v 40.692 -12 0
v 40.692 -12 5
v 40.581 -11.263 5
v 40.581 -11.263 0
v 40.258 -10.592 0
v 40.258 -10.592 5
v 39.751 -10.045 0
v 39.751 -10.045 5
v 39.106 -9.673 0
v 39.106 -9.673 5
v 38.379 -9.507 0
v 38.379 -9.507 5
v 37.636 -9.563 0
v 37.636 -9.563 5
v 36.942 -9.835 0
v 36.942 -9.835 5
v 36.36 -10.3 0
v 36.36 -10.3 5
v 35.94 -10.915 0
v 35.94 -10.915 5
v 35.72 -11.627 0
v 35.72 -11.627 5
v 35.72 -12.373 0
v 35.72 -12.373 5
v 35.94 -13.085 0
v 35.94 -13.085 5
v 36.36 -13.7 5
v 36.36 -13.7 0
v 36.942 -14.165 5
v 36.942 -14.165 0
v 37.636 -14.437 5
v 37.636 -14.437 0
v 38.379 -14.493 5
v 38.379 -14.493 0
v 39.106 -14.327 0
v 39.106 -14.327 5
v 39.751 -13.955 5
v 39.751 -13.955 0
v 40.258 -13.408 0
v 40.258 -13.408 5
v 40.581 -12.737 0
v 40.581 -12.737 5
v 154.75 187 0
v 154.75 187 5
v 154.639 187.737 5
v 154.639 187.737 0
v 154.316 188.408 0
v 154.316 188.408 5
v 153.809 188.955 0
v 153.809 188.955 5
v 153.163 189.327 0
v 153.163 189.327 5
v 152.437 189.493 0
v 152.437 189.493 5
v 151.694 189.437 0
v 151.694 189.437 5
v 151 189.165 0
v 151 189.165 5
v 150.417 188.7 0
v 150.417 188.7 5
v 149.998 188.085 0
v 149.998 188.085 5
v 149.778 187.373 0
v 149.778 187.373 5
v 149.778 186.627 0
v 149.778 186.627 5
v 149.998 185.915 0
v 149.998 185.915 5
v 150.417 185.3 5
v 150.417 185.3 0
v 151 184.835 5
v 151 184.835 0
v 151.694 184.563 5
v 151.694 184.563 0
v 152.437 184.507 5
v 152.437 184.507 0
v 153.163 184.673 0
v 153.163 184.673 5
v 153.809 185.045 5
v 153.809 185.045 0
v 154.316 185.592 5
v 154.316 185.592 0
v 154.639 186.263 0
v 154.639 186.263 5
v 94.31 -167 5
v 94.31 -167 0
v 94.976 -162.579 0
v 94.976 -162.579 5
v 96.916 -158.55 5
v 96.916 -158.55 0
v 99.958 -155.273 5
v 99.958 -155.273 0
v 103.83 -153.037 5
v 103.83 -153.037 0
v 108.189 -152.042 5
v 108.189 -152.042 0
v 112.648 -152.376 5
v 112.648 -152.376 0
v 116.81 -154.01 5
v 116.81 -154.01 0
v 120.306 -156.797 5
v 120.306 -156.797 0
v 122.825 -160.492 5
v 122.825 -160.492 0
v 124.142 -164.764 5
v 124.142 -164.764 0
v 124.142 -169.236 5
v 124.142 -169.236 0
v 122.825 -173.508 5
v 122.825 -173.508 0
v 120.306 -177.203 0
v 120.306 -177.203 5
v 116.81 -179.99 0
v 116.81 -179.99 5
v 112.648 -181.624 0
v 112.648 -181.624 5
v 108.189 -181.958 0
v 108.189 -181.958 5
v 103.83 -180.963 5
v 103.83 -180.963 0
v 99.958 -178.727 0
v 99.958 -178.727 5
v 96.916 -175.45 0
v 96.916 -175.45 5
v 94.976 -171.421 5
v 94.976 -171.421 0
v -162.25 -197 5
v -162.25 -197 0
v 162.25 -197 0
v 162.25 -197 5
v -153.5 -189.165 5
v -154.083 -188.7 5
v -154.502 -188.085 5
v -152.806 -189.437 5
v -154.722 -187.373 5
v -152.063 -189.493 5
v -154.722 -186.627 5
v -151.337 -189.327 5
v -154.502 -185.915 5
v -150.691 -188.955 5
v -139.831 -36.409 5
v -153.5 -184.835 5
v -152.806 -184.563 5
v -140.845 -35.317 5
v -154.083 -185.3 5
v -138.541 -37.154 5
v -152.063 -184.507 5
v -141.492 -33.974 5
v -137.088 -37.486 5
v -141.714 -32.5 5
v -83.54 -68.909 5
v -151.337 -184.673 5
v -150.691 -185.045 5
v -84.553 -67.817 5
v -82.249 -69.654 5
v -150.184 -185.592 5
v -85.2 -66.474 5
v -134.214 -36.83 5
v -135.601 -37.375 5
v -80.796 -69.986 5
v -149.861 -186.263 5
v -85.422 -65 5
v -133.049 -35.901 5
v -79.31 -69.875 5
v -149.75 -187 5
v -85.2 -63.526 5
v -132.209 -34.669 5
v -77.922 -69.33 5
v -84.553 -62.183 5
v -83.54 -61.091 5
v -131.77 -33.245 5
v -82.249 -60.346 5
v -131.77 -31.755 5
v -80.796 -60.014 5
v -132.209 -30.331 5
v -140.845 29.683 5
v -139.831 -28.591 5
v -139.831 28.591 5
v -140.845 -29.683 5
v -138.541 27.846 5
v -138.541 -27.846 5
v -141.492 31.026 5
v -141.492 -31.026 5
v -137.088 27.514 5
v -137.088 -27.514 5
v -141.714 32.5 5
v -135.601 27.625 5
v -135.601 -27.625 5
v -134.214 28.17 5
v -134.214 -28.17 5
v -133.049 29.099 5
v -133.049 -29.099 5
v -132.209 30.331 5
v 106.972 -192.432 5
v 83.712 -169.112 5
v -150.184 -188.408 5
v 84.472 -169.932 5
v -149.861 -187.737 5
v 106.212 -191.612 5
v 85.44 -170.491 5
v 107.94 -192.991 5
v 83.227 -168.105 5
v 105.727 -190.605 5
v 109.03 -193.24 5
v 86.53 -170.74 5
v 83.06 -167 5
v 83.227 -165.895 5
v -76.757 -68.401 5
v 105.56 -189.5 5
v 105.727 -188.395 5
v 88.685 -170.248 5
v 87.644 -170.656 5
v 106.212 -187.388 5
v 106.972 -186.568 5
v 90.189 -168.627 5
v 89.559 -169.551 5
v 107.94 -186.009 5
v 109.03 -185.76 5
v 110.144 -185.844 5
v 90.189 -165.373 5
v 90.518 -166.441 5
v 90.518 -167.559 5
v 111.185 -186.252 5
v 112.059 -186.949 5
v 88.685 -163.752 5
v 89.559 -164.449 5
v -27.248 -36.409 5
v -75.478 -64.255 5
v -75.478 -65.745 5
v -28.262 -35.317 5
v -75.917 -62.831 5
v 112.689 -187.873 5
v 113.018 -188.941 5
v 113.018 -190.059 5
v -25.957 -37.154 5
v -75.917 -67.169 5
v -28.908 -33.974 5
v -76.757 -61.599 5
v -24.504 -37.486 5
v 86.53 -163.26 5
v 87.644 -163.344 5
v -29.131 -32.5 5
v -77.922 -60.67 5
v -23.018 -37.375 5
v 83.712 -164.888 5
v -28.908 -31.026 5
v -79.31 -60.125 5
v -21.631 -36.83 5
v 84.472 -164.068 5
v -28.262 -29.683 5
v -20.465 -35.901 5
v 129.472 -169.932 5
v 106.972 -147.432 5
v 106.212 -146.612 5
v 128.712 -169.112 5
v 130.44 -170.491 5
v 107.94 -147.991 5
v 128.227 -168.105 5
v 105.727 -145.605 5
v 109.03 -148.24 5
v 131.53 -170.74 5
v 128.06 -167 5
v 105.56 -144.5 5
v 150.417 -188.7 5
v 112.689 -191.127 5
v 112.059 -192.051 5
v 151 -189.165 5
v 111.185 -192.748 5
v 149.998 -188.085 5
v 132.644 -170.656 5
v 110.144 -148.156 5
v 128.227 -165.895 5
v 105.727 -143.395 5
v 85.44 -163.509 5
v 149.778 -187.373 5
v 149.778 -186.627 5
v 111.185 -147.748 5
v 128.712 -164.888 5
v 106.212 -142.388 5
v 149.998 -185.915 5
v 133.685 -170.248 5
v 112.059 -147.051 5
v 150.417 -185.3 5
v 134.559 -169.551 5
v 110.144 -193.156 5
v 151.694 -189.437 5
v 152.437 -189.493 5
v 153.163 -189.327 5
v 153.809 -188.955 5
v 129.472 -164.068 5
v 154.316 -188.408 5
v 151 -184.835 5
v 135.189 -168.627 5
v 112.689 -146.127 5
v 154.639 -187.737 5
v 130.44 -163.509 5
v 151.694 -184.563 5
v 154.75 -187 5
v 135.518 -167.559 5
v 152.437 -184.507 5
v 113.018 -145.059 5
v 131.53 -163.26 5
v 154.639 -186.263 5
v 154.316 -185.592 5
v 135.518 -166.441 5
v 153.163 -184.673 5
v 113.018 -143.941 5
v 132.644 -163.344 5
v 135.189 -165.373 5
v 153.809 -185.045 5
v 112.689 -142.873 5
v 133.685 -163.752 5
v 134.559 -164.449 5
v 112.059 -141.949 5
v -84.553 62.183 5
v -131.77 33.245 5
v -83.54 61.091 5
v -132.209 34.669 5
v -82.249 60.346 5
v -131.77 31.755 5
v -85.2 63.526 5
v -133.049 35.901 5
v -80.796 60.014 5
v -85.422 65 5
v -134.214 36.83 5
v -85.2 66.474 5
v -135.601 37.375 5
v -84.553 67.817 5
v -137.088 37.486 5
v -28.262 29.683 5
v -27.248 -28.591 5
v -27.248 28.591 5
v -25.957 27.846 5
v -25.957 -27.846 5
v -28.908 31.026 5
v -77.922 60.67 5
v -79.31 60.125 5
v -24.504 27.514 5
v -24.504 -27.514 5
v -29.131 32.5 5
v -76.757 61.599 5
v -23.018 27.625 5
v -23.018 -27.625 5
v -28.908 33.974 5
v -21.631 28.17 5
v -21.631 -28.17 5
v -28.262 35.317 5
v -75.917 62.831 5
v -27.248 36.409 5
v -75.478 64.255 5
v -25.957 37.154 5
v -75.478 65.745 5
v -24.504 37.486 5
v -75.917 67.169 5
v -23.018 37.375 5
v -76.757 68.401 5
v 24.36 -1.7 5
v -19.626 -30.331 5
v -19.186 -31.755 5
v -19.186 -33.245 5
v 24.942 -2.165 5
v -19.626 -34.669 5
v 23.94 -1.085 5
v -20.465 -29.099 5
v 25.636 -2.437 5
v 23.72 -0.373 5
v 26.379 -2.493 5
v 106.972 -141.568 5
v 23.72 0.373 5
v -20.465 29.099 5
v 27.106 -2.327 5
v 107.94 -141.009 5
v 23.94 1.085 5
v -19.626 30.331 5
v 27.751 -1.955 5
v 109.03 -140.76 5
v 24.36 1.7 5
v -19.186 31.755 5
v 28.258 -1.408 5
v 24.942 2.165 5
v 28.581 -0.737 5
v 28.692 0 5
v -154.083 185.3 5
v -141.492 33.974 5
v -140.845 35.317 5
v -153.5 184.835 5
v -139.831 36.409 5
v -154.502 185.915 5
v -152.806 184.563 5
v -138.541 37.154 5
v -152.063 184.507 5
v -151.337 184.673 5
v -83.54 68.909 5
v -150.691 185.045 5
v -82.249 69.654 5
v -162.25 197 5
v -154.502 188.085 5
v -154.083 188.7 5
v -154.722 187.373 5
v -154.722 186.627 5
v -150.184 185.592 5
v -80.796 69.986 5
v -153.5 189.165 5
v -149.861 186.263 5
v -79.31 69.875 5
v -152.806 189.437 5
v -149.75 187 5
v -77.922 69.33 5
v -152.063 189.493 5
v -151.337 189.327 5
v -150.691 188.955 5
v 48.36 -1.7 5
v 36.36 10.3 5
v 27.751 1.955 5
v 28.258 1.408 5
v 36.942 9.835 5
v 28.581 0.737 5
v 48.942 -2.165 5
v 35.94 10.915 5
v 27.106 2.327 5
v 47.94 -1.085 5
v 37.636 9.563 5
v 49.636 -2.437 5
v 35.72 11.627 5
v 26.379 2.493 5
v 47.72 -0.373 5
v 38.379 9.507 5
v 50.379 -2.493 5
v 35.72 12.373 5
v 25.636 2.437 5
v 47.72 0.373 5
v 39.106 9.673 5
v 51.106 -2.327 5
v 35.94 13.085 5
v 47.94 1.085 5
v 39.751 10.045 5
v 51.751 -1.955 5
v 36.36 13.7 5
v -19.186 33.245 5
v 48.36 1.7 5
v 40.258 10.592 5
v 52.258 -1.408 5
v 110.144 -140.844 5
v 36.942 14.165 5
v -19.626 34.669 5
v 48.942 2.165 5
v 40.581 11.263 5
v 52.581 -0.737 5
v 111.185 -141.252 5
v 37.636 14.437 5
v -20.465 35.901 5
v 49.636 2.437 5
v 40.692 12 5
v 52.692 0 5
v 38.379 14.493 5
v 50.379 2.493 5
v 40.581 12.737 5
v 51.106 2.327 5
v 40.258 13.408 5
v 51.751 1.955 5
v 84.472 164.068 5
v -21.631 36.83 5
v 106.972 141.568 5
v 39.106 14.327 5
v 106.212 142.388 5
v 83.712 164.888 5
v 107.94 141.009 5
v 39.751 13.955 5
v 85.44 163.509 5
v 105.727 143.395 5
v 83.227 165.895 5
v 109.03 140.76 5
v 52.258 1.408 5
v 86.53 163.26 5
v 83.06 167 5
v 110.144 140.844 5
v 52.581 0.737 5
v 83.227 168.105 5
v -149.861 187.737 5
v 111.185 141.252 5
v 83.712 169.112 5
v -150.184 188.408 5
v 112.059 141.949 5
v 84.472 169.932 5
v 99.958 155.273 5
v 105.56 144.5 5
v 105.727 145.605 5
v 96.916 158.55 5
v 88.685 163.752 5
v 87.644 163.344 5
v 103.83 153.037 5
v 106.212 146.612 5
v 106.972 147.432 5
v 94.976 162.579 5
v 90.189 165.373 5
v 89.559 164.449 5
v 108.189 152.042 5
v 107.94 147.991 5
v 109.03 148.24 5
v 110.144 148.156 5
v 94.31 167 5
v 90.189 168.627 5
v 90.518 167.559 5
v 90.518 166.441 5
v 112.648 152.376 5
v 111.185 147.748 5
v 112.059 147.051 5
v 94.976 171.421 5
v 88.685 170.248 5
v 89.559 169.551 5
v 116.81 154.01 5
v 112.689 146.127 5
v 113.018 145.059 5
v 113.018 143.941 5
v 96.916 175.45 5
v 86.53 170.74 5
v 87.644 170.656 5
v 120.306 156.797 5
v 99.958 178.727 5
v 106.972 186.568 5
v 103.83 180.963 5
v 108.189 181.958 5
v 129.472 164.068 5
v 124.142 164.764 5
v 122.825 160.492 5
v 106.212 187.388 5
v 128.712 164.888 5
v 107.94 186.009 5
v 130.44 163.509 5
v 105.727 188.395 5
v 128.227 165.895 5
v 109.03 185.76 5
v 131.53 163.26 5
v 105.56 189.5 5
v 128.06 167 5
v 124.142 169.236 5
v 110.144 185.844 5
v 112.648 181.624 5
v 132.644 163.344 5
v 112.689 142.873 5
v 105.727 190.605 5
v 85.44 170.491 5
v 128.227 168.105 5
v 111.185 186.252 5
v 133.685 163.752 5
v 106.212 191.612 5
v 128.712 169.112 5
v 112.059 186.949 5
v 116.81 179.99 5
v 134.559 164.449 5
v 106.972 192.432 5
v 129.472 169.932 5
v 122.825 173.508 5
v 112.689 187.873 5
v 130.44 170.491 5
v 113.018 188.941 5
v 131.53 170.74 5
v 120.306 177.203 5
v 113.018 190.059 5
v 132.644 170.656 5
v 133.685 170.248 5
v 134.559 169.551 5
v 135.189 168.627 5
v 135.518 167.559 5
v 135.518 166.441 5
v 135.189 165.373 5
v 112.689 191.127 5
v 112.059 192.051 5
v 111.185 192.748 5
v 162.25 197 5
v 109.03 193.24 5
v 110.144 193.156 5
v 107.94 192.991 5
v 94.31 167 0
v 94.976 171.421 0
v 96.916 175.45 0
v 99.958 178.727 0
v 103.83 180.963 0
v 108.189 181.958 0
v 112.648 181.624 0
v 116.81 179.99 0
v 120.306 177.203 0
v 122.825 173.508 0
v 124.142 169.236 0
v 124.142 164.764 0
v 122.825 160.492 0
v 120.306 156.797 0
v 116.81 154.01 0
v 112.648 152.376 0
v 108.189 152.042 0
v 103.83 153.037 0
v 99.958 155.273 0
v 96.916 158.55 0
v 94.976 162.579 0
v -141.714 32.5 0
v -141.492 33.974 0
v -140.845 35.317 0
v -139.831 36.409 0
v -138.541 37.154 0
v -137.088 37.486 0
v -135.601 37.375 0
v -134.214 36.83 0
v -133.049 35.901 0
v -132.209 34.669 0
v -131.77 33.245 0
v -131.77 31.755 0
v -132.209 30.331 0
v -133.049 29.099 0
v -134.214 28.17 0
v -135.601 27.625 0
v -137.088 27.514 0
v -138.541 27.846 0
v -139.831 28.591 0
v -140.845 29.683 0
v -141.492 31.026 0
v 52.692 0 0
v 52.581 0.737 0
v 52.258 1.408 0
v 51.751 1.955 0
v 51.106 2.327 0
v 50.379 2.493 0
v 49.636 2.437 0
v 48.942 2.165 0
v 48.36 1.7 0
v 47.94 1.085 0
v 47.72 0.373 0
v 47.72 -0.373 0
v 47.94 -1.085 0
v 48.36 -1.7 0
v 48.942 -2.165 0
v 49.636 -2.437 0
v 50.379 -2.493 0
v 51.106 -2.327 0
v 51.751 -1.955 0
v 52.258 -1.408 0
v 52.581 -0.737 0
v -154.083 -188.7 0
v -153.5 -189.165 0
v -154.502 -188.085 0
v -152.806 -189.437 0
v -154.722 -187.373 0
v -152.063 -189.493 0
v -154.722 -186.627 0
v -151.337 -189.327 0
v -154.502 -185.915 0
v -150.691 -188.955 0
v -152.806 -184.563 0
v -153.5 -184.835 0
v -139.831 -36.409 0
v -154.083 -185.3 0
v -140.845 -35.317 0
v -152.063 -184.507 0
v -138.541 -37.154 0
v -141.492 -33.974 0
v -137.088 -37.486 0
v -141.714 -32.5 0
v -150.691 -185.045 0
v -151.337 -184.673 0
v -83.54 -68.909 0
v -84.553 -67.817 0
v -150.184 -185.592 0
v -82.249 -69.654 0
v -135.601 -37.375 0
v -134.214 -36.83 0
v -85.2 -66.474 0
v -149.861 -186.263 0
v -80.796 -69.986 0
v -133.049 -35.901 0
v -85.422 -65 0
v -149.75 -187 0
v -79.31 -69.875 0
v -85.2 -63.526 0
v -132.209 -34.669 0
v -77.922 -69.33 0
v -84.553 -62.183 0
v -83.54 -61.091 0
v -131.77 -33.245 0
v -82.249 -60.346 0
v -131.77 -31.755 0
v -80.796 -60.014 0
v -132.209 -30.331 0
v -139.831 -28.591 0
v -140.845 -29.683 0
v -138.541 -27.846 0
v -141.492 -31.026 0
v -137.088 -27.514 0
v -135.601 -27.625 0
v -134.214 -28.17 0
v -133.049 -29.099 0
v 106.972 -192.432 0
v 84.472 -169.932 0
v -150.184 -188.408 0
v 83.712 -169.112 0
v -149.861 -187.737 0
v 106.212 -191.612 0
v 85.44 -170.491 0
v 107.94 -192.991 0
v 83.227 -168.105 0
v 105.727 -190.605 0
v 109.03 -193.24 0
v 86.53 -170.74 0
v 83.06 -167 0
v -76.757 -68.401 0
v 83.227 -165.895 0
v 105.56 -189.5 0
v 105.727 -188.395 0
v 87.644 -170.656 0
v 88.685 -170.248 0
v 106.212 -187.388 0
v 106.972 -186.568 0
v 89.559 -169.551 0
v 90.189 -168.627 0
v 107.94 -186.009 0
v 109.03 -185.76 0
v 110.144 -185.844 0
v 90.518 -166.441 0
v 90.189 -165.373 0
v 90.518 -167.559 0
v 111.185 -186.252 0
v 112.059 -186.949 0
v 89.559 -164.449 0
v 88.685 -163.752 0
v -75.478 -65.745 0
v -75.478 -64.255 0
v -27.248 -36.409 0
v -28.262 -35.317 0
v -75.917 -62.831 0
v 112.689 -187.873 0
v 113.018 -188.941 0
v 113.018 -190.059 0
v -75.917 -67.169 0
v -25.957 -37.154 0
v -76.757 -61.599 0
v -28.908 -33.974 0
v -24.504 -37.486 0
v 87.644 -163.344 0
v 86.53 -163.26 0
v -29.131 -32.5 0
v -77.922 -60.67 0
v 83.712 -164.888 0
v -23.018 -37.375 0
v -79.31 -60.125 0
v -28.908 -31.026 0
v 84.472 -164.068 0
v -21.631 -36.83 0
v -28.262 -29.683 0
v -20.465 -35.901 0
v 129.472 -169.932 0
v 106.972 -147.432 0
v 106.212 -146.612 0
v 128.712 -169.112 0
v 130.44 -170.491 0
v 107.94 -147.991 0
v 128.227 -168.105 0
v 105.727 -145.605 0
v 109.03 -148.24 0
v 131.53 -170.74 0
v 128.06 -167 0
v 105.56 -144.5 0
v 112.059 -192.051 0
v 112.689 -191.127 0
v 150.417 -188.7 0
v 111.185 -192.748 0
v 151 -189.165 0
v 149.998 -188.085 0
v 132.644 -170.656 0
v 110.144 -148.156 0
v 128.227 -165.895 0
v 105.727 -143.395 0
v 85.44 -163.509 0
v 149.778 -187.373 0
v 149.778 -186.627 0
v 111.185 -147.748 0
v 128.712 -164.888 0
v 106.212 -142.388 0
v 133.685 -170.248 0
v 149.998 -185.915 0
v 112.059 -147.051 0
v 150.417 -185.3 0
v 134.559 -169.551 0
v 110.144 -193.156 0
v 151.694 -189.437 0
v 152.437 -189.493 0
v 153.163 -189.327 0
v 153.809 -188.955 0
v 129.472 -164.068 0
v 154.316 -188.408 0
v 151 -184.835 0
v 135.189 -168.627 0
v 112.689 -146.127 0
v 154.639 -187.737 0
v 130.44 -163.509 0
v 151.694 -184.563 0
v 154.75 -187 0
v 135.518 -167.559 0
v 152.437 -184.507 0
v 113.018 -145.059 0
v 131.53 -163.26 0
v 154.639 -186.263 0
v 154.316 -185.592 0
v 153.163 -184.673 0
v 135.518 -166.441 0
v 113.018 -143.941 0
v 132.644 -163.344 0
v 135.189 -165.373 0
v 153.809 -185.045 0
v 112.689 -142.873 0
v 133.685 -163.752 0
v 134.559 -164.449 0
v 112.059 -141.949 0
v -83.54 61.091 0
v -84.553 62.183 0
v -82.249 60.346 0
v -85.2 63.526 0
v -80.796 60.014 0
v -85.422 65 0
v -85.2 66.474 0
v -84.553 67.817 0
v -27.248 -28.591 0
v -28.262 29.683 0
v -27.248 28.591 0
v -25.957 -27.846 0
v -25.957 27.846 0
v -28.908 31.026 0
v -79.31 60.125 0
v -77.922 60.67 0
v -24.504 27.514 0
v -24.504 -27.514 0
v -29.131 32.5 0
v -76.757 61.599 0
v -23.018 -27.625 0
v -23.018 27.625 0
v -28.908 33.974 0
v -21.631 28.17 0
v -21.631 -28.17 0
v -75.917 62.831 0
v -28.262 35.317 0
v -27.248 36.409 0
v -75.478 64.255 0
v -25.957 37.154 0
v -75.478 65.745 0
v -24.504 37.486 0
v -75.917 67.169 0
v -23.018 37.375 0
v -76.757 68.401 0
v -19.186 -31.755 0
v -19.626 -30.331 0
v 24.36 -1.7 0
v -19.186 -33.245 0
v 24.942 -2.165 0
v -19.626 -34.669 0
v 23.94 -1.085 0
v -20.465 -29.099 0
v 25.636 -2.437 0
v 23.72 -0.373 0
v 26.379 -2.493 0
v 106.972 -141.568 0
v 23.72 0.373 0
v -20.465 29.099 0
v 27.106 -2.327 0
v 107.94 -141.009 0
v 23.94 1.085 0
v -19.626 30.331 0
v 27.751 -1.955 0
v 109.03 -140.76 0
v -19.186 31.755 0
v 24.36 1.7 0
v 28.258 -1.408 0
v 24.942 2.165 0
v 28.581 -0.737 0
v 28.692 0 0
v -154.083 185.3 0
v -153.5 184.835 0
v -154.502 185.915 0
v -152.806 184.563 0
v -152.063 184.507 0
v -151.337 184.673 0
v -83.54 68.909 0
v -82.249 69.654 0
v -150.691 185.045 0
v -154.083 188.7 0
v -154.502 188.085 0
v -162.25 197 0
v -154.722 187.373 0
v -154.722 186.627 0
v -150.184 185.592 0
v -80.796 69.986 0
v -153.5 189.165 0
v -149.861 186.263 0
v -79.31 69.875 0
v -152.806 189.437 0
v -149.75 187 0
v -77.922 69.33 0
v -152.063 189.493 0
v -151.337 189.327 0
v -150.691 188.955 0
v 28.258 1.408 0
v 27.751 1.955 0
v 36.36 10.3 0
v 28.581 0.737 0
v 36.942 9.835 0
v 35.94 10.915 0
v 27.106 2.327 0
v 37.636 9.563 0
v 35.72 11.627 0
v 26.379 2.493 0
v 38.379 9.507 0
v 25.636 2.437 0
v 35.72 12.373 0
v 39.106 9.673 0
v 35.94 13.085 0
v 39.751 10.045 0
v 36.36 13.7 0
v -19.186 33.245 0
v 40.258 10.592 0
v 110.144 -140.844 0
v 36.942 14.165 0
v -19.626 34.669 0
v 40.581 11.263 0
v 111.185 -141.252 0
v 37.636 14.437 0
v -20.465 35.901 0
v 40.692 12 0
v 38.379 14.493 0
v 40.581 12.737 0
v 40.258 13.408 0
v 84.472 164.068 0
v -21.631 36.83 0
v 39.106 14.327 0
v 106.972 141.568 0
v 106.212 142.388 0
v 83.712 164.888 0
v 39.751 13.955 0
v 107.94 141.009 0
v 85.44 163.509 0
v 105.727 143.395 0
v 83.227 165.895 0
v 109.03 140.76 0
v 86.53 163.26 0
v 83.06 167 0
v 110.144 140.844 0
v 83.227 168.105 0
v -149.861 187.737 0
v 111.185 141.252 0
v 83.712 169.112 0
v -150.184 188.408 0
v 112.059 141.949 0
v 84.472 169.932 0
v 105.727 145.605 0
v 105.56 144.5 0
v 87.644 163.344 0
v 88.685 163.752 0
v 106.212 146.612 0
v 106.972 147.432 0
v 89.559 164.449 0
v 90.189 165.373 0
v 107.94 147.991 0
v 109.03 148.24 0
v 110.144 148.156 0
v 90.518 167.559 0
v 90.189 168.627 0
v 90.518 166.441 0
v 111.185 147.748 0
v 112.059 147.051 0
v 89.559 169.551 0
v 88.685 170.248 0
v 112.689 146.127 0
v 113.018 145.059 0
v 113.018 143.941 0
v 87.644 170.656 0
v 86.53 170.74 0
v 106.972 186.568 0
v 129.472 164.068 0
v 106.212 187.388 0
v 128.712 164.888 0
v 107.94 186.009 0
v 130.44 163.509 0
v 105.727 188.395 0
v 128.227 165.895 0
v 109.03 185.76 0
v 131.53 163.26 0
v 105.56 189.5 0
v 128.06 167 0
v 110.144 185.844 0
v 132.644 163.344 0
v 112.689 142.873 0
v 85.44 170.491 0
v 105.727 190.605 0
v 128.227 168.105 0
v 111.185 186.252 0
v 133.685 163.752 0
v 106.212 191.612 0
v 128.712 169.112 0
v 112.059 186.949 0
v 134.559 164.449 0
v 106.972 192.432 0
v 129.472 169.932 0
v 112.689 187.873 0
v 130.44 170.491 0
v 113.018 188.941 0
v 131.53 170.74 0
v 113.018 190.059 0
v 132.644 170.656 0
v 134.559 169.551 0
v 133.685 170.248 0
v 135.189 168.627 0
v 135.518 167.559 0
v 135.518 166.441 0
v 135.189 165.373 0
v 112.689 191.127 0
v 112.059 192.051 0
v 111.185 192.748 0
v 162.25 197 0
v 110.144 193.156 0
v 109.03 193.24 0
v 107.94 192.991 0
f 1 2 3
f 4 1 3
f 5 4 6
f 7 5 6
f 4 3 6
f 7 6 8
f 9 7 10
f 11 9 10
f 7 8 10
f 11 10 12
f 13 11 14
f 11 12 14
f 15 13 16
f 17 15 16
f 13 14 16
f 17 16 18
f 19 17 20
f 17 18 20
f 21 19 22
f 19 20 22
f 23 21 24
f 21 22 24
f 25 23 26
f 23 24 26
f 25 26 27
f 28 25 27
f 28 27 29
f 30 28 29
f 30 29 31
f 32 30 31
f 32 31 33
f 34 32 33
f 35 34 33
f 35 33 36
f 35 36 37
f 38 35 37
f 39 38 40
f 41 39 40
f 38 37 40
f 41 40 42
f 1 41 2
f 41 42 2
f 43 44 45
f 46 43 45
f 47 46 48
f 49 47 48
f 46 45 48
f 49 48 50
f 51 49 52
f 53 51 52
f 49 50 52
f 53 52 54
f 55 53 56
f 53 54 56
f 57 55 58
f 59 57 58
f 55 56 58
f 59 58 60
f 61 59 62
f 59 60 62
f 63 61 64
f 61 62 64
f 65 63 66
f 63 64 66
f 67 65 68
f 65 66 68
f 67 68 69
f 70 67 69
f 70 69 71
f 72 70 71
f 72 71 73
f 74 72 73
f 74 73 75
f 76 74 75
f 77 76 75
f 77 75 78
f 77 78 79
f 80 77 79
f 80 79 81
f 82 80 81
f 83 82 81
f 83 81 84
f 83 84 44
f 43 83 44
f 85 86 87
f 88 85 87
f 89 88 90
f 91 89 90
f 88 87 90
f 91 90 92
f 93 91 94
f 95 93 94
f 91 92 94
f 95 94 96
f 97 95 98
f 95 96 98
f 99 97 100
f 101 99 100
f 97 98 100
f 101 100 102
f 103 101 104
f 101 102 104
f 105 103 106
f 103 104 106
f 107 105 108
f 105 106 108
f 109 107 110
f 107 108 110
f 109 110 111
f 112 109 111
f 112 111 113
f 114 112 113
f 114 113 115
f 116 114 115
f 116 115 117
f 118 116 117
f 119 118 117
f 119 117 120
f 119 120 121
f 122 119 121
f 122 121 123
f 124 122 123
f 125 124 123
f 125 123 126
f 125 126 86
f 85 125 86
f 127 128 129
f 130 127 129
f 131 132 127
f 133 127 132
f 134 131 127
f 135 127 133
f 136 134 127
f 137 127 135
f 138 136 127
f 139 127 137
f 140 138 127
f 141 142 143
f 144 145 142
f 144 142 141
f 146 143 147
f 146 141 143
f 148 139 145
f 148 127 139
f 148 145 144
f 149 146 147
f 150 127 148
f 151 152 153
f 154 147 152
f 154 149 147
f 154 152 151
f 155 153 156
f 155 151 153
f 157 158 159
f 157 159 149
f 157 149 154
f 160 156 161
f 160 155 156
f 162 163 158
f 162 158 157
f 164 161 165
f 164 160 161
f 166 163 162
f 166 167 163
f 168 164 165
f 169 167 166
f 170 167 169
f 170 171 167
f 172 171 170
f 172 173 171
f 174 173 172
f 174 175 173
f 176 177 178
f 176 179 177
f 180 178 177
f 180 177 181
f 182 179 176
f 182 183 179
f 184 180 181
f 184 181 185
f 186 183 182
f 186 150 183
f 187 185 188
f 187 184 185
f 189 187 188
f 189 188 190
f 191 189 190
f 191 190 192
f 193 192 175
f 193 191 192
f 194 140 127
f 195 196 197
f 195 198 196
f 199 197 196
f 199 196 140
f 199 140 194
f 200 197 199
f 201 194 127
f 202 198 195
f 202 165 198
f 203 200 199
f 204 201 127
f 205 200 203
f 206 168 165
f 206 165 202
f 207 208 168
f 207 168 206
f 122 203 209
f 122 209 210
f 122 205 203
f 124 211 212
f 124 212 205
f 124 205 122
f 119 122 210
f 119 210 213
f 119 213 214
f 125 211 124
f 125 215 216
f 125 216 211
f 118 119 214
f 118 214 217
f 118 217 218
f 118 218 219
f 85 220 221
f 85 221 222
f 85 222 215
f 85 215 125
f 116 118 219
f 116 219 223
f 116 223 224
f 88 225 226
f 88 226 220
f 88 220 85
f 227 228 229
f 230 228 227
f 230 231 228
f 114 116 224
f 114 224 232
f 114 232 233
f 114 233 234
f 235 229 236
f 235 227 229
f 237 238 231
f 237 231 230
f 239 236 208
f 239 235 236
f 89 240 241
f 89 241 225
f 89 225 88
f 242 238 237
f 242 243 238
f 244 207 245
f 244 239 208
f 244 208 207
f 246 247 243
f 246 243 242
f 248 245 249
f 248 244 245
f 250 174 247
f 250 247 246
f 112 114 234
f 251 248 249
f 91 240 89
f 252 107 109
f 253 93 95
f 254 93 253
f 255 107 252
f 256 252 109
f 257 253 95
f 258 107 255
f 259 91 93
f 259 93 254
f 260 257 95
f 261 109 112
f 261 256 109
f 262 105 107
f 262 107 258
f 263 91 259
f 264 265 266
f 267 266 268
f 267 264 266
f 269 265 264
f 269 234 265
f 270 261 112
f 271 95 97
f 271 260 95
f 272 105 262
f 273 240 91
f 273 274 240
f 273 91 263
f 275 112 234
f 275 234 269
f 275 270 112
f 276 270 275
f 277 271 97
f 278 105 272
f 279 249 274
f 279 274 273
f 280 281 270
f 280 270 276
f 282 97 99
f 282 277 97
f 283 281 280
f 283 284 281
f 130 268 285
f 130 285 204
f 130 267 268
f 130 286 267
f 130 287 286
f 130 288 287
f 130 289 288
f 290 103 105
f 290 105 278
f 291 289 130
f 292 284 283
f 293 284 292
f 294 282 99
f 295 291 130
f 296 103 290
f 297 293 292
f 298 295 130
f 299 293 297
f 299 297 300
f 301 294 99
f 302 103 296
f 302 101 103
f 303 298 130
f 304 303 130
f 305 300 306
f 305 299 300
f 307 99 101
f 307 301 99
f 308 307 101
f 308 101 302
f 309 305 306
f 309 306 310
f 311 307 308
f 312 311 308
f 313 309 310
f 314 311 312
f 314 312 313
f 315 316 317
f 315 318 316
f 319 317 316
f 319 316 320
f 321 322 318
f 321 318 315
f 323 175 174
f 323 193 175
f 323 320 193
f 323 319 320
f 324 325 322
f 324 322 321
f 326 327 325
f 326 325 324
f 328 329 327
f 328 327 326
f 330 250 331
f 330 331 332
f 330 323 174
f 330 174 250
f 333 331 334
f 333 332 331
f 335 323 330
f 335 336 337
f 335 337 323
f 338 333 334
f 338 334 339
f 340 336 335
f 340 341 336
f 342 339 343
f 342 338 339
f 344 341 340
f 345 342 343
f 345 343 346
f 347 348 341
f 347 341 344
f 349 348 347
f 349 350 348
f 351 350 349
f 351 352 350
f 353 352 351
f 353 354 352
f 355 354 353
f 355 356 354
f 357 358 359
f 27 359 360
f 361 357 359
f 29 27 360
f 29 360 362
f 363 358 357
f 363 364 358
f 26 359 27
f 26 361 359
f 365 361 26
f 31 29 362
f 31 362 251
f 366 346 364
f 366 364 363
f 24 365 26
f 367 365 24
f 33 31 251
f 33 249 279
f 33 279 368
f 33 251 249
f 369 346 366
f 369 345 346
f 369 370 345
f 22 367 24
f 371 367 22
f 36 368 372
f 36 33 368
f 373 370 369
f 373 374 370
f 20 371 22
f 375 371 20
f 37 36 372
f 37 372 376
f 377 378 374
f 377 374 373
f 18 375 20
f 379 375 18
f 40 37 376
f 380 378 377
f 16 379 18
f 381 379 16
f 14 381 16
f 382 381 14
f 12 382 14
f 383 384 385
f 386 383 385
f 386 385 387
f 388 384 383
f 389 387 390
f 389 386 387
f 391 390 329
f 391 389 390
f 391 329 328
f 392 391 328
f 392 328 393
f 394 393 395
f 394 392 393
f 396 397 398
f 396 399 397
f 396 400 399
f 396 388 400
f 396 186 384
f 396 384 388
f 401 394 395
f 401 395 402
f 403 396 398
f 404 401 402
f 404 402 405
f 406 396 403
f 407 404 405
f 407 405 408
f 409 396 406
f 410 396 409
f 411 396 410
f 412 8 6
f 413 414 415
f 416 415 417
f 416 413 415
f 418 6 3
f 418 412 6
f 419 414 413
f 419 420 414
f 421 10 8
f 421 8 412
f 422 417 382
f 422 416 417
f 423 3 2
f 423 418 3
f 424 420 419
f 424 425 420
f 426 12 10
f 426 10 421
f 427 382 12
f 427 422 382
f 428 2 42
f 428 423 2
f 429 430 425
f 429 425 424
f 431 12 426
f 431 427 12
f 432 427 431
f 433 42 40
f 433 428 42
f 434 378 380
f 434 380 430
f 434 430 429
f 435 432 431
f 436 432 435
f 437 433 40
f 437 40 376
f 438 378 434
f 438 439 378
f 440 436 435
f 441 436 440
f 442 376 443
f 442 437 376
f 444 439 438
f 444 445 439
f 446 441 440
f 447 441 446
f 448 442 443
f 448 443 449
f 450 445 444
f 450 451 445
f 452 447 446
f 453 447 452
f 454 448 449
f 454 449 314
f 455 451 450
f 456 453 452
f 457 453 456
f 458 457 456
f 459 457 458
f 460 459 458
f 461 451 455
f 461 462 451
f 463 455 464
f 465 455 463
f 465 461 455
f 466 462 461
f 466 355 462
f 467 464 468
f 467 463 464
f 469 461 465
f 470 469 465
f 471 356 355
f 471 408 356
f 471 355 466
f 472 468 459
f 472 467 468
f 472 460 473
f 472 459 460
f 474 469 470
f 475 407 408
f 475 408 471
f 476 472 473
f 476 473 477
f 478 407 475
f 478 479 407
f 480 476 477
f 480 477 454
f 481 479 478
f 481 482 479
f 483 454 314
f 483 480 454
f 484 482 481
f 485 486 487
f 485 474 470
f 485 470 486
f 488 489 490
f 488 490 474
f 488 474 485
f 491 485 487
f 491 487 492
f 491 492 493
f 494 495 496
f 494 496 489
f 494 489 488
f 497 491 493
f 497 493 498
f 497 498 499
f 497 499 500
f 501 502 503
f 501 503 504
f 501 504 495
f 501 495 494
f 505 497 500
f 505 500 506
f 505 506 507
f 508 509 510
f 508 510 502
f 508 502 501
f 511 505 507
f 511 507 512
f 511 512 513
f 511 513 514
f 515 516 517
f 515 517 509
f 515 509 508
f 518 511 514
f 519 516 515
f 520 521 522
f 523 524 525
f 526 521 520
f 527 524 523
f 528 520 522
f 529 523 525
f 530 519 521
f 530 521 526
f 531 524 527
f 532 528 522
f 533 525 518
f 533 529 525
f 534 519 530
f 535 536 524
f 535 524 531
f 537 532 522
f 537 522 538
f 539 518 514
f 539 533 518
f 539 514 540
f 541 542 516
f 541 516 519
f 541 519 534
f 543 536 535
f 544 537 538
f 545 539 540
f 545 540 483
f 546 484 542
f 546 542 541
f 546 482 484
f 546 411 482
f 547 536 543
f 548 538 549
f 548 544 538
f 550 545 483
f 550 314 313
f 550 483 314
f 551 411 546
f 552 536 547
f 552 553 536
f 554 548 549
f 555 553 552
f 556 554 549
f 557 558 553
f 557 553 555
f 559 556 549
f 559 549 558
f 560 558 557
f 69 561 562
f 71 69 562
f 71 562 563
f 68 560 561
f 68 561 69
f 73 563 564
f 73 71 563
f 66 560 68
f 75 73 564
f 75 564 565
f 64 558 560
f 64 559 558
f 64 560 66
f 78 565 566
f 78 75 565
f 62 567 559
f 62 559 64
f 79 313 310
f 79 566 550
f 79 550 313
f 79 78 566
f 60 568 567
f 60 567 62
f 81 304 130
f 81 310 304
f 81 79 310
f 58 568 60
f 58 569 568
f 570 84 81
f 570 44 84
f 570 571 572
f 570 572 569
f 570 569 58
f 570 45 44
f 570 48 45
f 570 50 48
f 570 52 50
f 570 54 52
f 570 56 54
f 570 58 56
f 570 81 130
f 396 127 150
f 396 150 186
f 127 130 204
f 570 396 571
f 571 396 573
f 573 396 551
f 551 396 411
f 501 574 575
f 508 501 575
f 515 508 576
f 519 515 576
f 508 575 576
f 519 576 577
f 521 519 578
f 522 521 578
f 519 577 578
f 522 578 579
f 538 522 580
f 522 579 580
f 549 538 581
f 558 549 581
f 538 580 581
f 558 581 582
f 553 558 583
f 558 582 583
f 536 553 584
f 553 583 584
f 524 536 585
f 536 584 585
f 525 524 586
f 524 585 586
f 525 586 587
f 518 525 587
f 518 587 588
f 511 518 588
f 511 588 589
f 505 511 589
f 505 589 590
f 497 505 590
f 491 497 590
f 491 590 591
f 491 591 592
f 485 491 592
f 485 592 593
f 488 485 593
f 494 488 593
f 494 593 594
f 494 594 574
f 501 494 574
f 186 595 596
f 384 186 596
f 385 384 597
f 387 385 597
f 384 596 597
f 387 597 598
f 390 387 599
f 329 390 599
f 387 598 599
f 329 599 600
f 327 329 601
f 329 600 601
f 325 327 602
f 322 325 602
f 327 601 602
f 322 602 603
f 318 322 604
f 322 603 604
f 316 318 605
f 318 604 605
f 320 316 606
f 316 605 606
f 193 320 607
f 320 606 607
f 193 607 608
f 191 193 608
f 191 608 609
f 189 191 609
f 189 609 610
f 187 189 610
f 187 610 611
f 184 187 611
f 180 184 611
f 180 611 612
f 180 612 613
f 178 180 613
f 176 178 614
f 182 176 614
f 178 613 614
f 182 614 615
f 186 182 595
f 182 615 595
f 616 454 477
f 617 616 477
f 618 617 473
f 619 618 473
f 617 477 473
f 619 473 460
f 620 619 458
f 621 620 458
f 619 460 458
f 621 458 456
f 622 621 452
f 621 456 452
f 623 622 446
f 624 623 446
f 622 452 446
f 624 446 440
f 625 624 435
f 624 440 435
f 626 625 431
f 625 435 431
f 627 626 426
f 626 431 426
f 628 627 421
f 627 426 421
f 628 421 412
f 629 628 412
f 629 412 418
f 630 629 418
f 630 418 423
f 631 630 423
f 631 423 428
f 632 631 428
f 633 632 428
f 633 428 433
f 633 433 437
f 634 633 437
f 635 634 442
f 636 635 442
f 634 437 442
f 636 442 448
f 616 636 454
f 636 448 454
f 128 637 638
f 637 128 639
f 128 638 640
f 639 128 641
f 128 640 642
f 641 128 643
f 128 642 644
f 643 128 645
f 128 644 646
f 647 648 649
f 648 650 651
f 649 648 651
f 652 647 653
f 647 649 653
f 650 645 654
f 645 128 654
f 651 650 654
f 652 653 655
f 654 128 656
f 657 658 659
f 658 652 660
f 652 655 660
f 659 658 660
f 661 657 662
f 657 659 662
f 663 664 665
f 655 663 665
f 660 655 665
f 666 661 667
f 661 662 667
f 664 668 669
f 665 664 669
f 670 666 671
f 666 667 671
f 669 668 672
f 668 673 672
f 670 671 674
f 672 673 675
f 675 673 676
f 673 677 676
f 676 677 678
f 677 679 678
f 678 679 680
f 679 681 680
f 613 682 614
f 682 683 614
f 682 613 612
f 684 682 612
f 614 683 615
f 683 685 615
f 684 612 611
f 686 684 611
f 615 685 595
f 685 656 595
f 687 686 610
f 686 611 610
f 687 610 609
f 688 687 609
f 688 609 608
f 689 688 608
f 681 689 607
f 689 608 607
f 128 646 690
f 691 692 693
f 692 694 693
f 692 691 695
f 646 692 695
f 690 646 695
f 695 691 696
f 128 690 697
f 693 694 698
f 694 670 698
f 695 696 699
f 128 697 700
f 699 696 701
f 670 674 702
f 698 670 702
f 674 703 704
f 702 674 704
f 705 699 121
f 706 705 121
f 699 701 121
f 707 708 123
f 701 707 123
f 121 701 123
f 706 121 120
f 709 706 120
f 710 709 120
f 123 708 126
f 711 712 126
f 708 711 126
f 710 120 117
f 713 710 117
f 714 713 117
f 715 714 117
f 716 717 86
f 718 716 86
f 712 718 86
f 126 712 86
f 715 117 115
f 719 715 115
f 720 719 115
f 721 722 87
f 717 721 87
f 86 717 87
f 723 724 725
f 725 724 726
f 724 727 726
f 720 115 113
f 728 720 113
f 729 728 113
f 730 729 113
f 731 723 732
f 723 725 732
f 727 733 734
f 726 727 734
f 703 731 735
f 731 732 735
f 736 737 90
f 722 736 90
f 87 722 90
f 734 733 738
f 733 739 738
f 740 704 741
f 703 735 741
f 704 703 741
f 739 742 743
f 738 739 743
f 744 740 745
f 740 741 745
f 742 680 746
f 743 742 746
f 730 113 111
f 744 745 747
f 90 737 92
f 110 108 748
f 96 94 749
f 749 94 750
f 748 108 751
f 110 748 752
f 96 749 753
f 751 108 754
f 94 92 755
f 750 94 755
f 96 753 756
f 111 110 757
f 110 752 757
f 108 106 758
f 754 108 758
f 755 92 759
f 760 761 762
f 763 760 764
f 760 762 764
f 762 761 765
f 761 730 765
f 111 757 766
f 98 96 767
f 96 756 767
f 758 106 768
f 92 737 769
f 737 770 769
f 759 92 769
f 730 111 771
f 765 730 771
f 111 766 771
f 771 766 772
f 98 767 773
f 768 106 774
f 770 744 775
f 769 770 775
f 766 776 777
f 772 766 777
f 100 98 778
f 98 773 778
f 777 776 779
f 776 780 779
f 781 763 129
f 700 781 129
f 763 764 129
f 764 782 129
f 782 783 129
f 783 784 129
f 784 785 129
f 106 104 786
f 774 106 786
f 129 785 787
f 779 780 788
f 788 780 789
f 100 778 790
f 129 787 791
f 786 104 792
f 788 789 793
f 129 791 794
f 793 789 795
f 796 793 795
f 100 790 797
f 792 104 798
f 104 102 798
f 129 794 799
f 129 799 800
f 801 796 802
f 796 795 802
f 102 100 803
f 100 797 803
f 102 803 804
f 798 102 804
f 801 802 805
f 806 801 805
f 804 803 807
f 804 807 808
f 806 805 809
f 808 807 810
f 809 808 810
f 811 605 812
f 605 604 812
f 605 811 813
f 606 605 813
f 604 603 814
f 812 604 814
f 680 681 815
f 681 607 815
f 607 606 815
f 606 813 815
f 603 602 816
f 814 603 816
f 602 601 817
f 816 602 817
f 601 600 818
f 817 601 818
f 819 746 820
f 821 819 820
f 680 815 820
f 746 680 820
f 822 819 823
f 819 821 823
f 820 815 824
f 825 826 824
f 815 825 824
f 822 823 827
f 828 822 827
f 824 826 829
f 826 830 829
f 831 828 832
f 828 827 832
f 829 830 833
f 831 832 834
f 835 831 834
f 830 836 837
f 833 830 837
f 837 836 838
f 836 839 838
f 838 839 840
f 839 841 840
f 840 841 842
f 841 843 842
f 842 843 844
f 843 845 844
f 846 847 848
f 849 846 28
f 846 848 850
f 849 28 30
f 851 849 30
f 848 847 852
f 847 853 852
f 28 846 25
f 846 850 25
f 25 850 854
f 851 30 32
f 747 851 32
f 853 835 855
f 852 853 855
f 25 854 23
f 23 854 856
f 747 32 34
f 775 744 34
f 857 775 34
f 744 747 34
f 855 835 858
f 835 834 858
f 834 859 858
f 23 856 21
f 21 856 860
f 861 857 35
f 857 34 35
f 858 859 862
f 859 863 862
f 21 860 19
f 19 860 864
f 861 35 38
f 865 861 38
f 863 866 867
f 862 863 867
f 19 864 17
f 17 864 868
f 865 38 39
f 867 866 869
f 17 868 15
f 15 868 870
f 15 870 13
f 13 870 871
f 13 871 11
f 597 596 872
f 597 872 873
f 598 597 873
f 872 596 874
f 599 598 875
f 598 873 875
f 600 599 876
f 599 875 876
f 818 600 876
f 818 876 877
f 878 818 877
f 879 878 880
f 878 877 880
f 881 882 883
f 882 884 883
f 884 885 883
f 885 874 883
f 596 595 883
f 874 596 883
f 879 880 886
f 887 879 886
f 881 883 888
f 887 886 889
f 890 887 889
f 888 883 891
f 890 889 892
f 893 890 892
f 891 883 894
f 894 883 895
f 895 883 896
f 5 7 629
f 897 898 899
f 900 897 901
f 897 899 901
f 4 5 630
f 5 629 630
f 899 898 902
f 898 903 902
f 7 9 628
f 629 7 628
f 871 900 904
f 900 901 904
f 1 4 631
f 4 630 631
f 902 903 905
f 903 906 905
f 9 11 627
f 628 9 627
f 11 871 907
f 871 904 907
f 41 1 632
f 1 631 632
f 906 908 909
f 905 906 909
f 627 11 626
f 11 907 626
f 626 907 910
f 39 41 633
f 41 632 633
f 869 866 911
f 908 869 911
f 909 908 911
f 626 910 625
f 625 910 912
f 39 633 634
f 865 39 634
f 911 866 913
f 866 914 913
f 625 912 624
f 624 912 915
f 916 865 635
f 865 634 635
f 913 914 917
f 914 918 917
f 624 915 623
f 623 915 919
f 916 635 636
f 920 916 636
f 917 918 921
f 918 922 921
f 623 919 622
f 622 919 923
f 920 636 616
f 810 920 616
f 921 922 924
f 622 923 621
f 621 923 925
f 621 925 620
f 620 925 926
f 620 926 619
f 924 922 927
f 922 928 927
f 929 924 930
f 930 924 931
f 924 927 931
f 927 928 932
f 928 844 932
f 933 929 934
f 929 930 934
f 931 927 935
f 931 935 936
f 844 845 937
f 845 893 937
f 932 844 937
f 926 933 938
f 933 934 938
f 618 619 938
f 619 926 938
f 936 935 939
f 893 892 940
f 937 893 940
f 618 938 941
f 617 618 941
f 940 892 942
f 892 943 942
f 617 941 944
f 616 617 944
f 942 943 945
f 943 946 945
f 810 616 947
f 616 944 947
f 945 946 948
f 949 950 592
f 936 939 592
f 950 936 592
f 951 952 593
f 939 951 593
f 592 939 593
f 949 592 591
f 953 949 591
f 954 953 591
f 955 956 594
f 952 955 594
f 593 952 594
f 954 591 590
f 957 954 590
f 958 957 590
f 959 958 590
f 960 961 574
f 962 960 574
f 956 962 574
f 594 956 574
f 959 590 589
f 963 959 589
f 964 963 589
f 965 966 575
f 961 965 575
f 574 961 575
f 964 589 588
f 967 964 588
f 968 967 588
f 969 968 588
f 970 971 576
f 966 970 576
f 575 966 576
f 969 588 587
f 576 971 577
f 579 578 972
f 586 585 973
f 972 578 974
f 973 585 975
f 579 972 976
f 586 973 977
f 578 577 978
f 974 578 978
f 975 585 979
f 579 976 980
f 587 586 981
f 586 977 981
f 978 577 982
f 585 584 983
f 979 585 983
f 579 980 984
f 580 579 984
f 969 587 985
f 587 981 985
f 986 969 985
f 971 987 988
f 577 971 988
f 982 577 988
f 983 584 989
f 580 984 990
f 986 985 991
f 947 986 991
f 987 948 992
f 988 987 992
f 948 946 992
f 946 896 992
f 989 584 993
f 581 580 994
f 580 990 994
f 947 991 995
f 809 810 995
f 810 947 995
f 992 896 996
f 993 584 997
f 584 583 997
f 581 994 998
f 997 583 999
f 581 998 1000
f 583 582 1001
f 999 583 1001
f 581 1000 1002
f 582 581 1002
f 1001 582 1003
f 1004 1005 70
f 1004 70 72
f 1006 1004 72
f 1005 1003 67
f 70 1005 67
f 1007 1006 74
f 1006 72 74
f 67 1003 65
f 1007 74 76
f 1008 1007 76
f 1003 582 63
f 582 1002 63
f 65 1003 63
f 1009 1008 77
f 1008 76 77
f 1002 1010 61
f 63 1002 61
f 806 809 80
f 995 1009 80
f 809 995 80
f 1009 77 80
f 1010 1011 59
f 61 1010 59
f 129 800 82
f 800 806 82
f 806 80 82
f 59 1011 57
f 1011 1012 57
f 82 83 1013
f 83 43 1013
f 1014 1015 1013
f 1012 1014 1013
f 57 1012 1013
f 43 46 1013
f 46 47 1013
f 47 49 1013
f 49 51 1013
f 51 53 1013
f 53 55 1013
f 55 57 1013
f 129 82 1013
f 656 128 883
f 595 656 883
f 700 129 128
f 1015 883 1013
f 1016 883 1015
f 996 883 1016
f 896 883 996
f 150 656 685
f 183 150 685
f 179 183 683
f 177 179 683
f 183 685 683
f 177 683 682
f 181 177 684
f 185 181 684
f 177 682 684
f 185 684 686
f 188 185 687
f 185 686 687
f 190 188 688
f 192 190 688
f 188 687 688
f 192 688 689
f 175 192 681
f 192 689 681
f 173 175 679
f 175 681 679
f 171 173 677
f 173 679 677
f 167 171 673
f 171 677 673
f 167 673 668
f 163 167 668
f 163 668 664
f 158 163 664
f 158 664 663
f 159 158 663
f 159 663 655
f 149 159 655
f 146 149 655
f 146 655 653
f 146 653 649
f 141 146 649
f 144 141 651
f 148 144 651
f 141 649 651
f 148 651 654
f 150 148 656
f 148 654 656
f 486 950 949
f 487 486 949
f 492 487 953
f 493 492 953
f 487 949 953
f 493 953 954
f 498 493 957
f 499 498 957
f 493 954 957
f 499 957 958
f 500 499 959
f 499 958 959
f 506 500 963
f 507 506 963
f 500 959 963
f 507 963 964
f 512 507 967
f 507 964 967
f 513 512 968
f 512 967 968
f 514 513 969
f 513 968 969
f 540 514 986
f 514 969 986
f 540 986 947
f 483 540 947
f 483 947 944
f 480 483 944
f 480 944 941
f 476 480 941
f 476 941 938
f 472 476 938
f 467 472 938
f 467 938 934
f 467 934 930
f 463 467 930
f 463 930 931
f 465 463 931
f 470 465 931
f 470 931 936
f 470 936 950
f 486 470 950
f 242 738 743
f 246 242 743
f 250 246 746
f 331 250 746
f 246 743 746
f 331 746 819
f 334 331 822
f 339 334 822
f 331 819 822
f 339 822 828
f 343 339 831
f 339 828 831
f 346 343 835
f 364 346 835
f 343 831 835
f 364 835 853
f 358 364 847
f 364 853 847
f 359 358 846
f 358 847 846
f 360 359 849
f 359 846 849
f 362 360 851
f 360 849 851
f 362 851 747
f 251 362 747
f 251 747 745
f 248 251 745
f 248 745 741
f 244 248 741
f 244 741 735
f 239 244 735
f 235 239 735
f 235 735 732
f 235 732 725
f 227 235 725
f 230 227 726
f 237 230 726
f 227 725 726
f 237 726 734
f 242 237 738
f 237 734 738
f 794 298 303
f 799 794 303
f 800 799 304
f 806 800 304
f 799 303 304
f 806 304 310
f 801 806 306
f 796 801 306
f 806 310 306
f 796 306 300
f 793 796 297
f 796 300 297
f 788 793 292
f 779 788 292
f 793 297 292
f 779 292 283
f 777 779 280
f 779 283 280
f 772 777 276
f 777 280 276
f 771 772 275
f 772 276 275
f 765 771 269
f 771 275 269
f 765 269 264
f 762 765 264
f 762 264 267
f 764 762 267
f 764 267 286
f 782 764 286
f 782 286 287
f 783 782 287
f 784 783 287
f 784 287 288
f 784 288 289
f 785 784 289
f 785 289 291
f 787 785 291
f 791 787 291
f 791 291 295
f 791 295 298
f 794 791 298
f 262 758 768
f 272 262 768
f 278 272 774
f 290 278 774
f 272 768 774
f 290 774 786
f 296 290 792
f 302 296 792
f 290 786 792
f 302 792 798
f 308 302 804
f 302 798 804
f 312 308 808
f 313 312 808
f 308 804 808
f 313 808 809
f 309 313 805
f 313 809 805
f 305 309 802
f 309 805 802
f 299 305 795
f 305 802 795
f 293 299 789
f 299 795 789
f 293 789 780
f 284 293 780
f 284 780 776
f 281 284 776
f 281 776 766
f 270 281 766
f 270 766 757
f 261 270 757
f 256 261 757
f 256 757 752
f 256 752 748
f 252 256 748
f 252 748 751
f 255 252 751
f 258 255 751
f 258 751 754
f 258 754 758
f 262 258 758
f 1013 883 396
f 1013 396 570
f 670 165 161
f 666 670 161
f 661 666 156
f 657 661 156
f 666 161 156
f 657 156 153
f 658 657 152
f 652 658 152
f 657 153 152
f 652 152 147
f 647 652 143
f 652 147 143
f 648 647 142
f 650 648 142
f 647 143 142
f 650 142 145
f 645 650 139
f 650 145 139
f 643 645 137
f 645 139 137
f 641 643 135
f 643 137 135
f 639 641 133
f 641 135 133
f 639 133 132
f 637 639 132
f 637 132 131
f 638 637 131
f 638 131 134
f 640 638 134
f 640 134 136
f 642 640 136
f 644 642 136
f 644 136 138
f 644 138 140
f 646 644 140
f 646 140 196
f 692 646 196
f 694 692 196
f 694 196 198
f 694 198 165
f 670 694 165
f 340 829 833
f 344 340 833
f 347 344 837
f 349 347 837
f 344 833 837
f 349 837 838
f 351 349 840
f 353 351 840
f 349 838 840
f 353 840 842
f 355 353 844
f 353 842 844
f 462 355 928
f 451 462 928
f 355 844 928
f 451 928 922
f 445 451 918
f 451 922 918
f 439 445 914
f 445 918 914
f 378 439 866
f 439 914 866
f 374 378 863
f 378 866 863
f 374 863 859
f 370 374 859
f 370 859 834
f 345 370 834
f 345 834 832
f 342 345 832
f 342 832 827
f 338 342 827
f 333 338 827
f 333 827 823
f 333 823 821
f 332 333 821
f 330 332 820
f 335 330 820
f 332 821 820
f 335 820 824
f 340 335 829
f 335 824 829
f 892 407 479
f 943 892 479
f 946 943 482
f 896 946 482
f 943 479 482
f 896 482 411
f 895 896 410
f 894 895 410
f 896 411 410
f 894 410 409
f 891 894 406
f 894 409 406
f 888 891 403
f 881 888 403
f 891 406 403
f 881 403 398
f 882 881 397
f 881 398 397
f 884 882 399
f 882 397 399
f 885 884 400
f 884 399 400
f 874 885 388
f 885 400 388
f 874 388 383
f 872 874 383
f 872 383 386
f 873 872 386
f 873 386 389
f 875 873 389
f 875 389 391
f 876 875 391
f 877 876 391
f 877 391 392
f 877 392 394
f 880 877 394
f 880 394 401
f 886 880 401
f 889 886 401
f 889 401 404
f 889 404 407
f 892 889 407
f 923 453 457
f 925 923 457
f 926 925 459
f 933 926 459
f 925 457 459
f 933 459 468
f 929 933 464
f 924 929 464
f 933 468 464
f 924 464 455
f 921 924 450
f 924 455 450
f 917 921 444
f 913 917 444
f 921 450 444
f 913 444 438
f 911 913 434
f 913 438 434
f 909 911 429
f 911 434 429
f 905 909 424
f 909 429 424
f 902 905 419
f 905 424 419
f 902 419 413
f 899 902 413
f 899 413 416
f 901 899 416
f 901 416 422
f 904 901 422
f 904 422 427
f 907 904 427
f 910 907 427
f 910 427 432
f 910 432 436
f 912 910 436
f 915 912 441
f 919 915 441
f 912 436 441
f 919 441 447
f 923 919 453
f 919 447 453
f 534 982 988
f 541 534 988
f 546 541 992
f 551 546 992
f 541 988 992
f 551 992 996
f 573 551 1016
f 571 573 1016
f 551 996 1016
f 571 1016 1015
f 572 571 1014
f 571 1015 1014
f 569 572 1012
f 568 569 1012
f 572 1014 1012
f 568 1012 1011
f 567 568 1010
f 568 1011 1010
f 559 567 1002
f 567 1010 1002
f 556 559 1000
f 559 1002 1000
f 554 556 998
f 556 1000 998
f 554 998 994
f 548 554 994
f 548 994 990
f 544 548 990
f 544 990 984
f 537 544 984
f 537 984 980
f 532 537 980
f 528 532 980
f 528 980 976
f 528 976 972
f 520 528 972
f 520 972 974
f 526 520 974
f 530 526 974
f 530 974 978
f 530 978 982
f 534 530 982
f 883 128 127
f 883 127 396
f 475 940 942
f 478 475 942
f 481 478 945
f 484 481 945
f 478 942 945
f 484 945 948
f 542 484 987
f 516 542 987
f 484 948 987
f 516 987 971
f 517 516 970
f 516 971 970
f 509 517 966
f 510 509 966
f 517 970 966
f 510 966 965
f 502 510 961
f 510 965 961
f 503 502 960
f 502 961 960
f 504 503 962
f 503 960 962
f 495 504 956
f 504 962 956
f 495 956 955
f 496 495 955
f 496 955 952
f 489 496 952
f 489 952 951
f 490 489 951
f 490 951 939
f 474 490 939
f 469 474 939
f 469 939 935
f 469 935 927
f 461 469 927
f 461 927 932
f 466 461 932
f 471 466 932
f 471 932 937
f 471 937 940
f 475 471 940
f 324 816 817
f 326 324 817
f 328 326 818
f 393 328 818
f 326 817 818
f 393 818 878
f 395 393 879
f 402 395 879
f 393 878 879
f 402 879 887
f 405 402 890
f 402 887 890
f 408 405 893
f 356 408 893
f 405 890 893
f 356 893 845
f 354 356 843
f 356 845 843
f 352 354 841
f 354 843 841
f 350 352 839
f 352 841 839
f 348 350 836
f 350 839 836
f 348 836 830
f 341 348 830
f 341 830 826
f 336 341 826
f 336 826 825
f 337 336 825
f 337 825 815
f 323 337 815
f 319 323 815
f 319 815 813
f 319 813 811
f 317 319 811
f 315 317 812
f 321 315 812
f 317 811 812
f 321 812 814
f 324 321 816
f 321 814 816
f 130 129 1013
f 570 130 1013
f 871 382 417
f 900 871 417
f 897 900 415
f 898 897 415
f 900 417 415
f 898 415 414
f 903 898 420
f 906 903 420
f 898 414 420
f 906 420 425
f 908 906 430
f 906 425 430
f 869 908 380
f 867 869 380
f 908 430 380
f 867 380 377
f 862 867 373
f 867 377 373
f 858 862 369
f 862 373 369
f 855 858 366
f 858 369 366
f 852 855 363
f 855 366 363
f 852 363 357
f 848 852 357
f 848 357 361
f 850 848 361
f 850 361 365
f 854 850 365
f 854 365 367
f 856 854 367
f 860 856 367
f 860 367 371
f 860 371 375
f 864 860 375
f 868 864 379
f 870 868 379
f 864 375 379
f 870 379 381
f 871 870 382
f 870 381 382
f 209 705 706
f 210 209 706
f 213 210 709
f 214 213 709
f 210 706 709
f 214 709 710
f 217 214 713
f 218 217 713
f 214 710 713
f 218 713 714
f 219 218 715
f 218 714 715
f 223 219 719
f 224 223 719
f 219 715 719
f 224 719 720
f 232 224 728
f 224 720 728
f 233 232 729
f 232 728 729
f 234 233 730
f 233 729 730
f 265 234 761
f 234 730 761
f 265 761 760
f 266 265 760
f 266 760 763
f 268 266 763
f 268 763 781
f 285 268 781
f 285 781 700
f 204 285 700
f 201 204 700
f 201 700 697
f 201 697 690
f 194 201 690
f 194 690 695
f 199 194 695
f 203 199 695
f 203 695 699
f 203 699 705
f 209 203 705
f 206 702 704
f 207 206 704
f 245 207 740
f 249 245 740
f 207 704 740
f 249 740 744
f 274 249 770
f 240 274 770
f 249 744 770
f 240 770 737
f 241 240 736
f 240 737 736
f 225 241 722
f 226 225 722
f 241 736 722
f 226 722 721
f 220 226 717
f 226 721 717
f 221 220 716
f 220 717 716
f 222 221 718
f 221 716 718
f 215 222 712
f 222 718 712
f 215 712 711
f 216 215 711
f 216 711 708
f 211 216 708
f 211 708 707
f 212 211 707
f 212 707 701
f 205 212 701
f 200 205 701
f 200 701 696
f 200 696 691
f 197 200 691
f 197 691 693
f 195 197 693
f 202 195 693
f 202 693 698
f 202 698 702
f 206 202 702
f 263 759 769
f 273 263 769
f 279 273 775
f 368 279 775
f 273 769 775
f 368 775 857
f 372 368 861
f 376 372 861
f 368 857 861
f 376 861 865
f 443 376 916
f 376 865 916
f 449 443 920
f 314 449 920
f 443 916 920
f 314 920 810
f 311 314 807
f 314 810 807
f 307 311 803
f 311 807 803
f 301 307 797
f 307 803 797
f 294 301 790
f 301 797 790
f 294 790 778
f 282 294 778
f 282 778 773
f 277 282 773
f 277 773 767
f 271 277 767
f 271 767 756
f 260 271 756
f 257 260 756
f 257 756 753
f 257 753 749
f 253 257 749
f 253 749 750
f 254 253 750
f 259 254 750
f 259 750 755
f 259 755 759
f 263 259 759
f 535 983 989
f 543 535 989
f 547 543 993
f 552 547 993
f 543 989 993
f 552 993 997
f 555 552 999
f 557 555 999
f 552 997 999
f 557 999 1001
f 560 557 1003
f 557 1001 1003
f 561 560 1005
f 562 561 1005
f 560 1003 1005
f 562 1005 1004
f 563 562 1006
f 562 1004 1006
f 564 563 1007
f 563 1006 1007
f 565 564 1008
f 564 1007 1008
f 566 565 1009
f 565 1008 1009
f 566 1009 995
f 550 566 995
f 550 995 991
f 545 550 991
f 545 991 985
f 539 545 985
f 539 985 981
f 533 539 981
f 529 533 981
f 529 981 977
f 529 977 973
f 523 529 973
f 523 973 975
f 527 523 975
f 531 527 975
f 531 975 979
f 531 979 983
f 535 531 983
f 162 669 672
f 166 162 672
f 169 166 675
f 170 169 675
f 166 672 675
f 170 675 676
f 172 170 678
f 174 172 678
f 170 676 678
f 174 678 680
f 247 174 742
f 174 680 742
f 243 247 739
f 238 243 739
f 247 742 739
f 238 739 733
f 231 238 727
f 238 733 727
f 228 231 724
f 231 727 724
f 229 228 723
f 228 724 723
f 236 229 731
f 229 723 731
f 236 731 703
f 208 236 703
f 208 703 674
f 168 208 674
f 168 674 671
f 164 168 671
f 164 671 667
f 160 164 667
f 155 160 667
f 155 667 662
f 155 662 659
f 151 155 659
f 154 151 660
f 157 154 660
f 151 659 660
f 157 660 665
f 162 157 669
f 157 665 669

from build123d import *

# Parameters (mm, degrees)
SKETCH1_W           = 324.5
SKETCH1_H           = 394
BOSS_EXTRUDE1_DEPTH = 5
SKETCH2_R           = 2.5
CUT_EXTRUDE1_DEPTH  = 256.262732298
SKETCH4_R           = 5
CUT_EXTRUDE3_DEPTH  = 5
SKETCH5_R           = 2.5
CUT_EXTRUDE4_DEPTH  = 5
SKETCH7_R           = 15
SKETCH7_R_2         = 3.75
CUT_EXTRUDE6_DEPTH  = 256.262732298


with BuildPart() as part:
    # Sketch1 → Boss-Extrude1 (new body)
    with BuildSketch(Plane.XY):
        Rectangle(SKETCH1_W, SKETCH1_H)
    extrude(amount=BOSS_EXTRUDE1_DEPTH)

    # Sketch2 → Cut-Extrude1 (cut, through all)
    with BuildSketch(Plane.XY.offset(5)):
        with Locations((152.25, 187)):
            Circle(SKETCH2_R)
        with Locations((-152.25, 187)):
            Circle(SKETCH2_R)
        with Locations((-152.25, -187)):
            Circle(SKETCH2_R)
        with Locations((152.25, -187)):
            Circle(SKETCH2_R)
    extrude(amount=-CUT_EXTRUDE1_DEPTH, mode=Mode.SUBTRACT)

    # Sketch4 → Cut-Extrude3 (cut)
    with BuildSketch(Plane(origin=(0, 0, 0), x_dir=(-1, 0, 0), z_dir=(0, 0, -1))):
        with Locations((80.422215232, 65)):
            Circle(SKETCH4_R)
        with Locations((136.713866478, 32.5)):
            Circle(SKETCH4_R)
        with Locations((136.713866478, -32.5)):
            Circle(SKETCH4_R)
        with Locations((80.422215232, -65)):
            Circle(SKETCH4_R)
        with Locations((24.130563986, -32.5)):
            Circle(SKETCH4_R)
        with Locations((24.130563986, 32.5)):
            Circle(SKETCH4_R)
    extrude(amount=-CUT_EXTRUDE3_DEPTH, mode=Mode.SUBTRACT)

    # Sketch5 → Cut-Extrude4 (cut)
    with BuildSketch(Plane.XY.offset(5)):
        with Locations((38.192392445, 12)):
            Circle(SKETCH5_R)
        with Locations((50.192392445, 0)):
            Circle(SKETCH5_R)
        with Locations((38.192392445, -12)):
            Circle(SKETCH5_R)
        with Locations((26.192392445, 0)):
            Circle(SKETCH5_R)
    extrude(amount=-CUT_EXTRUDE4_DEPTH, mode=Mode.SUBTRACT)

    # Sketch7 → Cut-Extrude6 (cut, through all)
    with BuildSketch(Plane(origin=(0, 0, 0), x_dir=(-1, 0, 0), z_dir=(0, 0, -1))):
        with Locations((-109.31, 167)):
            Circle(SKETCH7_R)
        with Locations((-109.31, -167)):
            Circle(SKETCH7_R)
        with Locations((-109.31, 189.5)):
            Circle(SKETCH7_R_2)
        with Locations((-109.31, -144.5)):
            Circle(SKETCH7_R_2)
        with Locations((-86.81, -167)):
            Circle(SKETCH7_R_2)
        with Locations((-109.31, -189.5)):
            Circle(SKETCH7_R_2)
        with Locations((-131.81, -167)):
            Circle(SKETCH7_R_2)
        with Locations((-86.81, 167)):
            Circle(SKETCH7_R_2)
        with Locations((-109.31, 144.5)):
            Circle(SKETCH7_R_2)
        with Locations((-131.81, 167)):
            Circle(SKETCH7_R_2)
    extrude(amount=-CUT_EXTRUDE6_DEPTH, mode=Mode.SUBTRACT)


solid = part.part
